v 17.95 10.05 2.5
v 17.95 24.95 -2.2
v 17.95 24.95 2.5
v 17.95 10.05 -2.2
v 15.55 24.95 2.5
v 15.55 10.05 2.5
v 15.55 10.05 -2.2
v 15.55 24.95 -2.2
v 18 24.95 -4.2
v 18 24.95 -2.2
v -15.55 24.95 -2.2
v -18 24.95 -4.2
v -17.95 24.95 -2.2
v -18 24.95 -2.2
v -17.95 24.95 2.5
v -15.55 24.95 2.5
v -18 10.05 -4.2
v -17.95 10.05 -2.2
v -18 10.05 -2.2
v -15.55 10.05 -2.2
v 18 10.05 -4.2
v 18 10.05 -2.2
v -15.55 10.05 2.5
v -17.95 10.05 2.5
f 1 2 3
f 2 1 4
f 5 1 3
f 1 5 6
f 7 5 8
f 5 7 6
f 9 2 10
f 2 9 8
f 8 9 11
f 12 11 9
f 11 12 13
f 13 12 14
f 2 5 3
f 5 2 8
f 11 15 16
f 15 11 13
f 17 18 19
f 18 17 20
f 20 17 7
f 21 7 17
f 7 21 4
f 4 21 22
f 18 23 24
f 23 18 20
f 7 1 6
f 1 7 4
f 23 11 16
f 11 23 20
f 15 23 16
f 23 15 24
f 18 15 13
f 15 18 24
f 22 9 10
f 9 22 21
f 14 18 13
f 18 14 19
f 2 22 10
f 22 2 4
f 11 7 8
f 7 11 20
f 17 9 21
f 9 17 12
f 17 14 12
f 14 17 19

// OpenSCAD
translate([15.55,10.05,-4]) cube([2.4,14.9,6.5]);
translate([-15.45-2.5,10.05,-4]) cube([2.4,14.9,6.5]);
translate([-(15.55+15.45+2.5+2.5)/2,10.05,-4.2]) cube([15.55+15.45+2.5+2.5,14.9,2]);
